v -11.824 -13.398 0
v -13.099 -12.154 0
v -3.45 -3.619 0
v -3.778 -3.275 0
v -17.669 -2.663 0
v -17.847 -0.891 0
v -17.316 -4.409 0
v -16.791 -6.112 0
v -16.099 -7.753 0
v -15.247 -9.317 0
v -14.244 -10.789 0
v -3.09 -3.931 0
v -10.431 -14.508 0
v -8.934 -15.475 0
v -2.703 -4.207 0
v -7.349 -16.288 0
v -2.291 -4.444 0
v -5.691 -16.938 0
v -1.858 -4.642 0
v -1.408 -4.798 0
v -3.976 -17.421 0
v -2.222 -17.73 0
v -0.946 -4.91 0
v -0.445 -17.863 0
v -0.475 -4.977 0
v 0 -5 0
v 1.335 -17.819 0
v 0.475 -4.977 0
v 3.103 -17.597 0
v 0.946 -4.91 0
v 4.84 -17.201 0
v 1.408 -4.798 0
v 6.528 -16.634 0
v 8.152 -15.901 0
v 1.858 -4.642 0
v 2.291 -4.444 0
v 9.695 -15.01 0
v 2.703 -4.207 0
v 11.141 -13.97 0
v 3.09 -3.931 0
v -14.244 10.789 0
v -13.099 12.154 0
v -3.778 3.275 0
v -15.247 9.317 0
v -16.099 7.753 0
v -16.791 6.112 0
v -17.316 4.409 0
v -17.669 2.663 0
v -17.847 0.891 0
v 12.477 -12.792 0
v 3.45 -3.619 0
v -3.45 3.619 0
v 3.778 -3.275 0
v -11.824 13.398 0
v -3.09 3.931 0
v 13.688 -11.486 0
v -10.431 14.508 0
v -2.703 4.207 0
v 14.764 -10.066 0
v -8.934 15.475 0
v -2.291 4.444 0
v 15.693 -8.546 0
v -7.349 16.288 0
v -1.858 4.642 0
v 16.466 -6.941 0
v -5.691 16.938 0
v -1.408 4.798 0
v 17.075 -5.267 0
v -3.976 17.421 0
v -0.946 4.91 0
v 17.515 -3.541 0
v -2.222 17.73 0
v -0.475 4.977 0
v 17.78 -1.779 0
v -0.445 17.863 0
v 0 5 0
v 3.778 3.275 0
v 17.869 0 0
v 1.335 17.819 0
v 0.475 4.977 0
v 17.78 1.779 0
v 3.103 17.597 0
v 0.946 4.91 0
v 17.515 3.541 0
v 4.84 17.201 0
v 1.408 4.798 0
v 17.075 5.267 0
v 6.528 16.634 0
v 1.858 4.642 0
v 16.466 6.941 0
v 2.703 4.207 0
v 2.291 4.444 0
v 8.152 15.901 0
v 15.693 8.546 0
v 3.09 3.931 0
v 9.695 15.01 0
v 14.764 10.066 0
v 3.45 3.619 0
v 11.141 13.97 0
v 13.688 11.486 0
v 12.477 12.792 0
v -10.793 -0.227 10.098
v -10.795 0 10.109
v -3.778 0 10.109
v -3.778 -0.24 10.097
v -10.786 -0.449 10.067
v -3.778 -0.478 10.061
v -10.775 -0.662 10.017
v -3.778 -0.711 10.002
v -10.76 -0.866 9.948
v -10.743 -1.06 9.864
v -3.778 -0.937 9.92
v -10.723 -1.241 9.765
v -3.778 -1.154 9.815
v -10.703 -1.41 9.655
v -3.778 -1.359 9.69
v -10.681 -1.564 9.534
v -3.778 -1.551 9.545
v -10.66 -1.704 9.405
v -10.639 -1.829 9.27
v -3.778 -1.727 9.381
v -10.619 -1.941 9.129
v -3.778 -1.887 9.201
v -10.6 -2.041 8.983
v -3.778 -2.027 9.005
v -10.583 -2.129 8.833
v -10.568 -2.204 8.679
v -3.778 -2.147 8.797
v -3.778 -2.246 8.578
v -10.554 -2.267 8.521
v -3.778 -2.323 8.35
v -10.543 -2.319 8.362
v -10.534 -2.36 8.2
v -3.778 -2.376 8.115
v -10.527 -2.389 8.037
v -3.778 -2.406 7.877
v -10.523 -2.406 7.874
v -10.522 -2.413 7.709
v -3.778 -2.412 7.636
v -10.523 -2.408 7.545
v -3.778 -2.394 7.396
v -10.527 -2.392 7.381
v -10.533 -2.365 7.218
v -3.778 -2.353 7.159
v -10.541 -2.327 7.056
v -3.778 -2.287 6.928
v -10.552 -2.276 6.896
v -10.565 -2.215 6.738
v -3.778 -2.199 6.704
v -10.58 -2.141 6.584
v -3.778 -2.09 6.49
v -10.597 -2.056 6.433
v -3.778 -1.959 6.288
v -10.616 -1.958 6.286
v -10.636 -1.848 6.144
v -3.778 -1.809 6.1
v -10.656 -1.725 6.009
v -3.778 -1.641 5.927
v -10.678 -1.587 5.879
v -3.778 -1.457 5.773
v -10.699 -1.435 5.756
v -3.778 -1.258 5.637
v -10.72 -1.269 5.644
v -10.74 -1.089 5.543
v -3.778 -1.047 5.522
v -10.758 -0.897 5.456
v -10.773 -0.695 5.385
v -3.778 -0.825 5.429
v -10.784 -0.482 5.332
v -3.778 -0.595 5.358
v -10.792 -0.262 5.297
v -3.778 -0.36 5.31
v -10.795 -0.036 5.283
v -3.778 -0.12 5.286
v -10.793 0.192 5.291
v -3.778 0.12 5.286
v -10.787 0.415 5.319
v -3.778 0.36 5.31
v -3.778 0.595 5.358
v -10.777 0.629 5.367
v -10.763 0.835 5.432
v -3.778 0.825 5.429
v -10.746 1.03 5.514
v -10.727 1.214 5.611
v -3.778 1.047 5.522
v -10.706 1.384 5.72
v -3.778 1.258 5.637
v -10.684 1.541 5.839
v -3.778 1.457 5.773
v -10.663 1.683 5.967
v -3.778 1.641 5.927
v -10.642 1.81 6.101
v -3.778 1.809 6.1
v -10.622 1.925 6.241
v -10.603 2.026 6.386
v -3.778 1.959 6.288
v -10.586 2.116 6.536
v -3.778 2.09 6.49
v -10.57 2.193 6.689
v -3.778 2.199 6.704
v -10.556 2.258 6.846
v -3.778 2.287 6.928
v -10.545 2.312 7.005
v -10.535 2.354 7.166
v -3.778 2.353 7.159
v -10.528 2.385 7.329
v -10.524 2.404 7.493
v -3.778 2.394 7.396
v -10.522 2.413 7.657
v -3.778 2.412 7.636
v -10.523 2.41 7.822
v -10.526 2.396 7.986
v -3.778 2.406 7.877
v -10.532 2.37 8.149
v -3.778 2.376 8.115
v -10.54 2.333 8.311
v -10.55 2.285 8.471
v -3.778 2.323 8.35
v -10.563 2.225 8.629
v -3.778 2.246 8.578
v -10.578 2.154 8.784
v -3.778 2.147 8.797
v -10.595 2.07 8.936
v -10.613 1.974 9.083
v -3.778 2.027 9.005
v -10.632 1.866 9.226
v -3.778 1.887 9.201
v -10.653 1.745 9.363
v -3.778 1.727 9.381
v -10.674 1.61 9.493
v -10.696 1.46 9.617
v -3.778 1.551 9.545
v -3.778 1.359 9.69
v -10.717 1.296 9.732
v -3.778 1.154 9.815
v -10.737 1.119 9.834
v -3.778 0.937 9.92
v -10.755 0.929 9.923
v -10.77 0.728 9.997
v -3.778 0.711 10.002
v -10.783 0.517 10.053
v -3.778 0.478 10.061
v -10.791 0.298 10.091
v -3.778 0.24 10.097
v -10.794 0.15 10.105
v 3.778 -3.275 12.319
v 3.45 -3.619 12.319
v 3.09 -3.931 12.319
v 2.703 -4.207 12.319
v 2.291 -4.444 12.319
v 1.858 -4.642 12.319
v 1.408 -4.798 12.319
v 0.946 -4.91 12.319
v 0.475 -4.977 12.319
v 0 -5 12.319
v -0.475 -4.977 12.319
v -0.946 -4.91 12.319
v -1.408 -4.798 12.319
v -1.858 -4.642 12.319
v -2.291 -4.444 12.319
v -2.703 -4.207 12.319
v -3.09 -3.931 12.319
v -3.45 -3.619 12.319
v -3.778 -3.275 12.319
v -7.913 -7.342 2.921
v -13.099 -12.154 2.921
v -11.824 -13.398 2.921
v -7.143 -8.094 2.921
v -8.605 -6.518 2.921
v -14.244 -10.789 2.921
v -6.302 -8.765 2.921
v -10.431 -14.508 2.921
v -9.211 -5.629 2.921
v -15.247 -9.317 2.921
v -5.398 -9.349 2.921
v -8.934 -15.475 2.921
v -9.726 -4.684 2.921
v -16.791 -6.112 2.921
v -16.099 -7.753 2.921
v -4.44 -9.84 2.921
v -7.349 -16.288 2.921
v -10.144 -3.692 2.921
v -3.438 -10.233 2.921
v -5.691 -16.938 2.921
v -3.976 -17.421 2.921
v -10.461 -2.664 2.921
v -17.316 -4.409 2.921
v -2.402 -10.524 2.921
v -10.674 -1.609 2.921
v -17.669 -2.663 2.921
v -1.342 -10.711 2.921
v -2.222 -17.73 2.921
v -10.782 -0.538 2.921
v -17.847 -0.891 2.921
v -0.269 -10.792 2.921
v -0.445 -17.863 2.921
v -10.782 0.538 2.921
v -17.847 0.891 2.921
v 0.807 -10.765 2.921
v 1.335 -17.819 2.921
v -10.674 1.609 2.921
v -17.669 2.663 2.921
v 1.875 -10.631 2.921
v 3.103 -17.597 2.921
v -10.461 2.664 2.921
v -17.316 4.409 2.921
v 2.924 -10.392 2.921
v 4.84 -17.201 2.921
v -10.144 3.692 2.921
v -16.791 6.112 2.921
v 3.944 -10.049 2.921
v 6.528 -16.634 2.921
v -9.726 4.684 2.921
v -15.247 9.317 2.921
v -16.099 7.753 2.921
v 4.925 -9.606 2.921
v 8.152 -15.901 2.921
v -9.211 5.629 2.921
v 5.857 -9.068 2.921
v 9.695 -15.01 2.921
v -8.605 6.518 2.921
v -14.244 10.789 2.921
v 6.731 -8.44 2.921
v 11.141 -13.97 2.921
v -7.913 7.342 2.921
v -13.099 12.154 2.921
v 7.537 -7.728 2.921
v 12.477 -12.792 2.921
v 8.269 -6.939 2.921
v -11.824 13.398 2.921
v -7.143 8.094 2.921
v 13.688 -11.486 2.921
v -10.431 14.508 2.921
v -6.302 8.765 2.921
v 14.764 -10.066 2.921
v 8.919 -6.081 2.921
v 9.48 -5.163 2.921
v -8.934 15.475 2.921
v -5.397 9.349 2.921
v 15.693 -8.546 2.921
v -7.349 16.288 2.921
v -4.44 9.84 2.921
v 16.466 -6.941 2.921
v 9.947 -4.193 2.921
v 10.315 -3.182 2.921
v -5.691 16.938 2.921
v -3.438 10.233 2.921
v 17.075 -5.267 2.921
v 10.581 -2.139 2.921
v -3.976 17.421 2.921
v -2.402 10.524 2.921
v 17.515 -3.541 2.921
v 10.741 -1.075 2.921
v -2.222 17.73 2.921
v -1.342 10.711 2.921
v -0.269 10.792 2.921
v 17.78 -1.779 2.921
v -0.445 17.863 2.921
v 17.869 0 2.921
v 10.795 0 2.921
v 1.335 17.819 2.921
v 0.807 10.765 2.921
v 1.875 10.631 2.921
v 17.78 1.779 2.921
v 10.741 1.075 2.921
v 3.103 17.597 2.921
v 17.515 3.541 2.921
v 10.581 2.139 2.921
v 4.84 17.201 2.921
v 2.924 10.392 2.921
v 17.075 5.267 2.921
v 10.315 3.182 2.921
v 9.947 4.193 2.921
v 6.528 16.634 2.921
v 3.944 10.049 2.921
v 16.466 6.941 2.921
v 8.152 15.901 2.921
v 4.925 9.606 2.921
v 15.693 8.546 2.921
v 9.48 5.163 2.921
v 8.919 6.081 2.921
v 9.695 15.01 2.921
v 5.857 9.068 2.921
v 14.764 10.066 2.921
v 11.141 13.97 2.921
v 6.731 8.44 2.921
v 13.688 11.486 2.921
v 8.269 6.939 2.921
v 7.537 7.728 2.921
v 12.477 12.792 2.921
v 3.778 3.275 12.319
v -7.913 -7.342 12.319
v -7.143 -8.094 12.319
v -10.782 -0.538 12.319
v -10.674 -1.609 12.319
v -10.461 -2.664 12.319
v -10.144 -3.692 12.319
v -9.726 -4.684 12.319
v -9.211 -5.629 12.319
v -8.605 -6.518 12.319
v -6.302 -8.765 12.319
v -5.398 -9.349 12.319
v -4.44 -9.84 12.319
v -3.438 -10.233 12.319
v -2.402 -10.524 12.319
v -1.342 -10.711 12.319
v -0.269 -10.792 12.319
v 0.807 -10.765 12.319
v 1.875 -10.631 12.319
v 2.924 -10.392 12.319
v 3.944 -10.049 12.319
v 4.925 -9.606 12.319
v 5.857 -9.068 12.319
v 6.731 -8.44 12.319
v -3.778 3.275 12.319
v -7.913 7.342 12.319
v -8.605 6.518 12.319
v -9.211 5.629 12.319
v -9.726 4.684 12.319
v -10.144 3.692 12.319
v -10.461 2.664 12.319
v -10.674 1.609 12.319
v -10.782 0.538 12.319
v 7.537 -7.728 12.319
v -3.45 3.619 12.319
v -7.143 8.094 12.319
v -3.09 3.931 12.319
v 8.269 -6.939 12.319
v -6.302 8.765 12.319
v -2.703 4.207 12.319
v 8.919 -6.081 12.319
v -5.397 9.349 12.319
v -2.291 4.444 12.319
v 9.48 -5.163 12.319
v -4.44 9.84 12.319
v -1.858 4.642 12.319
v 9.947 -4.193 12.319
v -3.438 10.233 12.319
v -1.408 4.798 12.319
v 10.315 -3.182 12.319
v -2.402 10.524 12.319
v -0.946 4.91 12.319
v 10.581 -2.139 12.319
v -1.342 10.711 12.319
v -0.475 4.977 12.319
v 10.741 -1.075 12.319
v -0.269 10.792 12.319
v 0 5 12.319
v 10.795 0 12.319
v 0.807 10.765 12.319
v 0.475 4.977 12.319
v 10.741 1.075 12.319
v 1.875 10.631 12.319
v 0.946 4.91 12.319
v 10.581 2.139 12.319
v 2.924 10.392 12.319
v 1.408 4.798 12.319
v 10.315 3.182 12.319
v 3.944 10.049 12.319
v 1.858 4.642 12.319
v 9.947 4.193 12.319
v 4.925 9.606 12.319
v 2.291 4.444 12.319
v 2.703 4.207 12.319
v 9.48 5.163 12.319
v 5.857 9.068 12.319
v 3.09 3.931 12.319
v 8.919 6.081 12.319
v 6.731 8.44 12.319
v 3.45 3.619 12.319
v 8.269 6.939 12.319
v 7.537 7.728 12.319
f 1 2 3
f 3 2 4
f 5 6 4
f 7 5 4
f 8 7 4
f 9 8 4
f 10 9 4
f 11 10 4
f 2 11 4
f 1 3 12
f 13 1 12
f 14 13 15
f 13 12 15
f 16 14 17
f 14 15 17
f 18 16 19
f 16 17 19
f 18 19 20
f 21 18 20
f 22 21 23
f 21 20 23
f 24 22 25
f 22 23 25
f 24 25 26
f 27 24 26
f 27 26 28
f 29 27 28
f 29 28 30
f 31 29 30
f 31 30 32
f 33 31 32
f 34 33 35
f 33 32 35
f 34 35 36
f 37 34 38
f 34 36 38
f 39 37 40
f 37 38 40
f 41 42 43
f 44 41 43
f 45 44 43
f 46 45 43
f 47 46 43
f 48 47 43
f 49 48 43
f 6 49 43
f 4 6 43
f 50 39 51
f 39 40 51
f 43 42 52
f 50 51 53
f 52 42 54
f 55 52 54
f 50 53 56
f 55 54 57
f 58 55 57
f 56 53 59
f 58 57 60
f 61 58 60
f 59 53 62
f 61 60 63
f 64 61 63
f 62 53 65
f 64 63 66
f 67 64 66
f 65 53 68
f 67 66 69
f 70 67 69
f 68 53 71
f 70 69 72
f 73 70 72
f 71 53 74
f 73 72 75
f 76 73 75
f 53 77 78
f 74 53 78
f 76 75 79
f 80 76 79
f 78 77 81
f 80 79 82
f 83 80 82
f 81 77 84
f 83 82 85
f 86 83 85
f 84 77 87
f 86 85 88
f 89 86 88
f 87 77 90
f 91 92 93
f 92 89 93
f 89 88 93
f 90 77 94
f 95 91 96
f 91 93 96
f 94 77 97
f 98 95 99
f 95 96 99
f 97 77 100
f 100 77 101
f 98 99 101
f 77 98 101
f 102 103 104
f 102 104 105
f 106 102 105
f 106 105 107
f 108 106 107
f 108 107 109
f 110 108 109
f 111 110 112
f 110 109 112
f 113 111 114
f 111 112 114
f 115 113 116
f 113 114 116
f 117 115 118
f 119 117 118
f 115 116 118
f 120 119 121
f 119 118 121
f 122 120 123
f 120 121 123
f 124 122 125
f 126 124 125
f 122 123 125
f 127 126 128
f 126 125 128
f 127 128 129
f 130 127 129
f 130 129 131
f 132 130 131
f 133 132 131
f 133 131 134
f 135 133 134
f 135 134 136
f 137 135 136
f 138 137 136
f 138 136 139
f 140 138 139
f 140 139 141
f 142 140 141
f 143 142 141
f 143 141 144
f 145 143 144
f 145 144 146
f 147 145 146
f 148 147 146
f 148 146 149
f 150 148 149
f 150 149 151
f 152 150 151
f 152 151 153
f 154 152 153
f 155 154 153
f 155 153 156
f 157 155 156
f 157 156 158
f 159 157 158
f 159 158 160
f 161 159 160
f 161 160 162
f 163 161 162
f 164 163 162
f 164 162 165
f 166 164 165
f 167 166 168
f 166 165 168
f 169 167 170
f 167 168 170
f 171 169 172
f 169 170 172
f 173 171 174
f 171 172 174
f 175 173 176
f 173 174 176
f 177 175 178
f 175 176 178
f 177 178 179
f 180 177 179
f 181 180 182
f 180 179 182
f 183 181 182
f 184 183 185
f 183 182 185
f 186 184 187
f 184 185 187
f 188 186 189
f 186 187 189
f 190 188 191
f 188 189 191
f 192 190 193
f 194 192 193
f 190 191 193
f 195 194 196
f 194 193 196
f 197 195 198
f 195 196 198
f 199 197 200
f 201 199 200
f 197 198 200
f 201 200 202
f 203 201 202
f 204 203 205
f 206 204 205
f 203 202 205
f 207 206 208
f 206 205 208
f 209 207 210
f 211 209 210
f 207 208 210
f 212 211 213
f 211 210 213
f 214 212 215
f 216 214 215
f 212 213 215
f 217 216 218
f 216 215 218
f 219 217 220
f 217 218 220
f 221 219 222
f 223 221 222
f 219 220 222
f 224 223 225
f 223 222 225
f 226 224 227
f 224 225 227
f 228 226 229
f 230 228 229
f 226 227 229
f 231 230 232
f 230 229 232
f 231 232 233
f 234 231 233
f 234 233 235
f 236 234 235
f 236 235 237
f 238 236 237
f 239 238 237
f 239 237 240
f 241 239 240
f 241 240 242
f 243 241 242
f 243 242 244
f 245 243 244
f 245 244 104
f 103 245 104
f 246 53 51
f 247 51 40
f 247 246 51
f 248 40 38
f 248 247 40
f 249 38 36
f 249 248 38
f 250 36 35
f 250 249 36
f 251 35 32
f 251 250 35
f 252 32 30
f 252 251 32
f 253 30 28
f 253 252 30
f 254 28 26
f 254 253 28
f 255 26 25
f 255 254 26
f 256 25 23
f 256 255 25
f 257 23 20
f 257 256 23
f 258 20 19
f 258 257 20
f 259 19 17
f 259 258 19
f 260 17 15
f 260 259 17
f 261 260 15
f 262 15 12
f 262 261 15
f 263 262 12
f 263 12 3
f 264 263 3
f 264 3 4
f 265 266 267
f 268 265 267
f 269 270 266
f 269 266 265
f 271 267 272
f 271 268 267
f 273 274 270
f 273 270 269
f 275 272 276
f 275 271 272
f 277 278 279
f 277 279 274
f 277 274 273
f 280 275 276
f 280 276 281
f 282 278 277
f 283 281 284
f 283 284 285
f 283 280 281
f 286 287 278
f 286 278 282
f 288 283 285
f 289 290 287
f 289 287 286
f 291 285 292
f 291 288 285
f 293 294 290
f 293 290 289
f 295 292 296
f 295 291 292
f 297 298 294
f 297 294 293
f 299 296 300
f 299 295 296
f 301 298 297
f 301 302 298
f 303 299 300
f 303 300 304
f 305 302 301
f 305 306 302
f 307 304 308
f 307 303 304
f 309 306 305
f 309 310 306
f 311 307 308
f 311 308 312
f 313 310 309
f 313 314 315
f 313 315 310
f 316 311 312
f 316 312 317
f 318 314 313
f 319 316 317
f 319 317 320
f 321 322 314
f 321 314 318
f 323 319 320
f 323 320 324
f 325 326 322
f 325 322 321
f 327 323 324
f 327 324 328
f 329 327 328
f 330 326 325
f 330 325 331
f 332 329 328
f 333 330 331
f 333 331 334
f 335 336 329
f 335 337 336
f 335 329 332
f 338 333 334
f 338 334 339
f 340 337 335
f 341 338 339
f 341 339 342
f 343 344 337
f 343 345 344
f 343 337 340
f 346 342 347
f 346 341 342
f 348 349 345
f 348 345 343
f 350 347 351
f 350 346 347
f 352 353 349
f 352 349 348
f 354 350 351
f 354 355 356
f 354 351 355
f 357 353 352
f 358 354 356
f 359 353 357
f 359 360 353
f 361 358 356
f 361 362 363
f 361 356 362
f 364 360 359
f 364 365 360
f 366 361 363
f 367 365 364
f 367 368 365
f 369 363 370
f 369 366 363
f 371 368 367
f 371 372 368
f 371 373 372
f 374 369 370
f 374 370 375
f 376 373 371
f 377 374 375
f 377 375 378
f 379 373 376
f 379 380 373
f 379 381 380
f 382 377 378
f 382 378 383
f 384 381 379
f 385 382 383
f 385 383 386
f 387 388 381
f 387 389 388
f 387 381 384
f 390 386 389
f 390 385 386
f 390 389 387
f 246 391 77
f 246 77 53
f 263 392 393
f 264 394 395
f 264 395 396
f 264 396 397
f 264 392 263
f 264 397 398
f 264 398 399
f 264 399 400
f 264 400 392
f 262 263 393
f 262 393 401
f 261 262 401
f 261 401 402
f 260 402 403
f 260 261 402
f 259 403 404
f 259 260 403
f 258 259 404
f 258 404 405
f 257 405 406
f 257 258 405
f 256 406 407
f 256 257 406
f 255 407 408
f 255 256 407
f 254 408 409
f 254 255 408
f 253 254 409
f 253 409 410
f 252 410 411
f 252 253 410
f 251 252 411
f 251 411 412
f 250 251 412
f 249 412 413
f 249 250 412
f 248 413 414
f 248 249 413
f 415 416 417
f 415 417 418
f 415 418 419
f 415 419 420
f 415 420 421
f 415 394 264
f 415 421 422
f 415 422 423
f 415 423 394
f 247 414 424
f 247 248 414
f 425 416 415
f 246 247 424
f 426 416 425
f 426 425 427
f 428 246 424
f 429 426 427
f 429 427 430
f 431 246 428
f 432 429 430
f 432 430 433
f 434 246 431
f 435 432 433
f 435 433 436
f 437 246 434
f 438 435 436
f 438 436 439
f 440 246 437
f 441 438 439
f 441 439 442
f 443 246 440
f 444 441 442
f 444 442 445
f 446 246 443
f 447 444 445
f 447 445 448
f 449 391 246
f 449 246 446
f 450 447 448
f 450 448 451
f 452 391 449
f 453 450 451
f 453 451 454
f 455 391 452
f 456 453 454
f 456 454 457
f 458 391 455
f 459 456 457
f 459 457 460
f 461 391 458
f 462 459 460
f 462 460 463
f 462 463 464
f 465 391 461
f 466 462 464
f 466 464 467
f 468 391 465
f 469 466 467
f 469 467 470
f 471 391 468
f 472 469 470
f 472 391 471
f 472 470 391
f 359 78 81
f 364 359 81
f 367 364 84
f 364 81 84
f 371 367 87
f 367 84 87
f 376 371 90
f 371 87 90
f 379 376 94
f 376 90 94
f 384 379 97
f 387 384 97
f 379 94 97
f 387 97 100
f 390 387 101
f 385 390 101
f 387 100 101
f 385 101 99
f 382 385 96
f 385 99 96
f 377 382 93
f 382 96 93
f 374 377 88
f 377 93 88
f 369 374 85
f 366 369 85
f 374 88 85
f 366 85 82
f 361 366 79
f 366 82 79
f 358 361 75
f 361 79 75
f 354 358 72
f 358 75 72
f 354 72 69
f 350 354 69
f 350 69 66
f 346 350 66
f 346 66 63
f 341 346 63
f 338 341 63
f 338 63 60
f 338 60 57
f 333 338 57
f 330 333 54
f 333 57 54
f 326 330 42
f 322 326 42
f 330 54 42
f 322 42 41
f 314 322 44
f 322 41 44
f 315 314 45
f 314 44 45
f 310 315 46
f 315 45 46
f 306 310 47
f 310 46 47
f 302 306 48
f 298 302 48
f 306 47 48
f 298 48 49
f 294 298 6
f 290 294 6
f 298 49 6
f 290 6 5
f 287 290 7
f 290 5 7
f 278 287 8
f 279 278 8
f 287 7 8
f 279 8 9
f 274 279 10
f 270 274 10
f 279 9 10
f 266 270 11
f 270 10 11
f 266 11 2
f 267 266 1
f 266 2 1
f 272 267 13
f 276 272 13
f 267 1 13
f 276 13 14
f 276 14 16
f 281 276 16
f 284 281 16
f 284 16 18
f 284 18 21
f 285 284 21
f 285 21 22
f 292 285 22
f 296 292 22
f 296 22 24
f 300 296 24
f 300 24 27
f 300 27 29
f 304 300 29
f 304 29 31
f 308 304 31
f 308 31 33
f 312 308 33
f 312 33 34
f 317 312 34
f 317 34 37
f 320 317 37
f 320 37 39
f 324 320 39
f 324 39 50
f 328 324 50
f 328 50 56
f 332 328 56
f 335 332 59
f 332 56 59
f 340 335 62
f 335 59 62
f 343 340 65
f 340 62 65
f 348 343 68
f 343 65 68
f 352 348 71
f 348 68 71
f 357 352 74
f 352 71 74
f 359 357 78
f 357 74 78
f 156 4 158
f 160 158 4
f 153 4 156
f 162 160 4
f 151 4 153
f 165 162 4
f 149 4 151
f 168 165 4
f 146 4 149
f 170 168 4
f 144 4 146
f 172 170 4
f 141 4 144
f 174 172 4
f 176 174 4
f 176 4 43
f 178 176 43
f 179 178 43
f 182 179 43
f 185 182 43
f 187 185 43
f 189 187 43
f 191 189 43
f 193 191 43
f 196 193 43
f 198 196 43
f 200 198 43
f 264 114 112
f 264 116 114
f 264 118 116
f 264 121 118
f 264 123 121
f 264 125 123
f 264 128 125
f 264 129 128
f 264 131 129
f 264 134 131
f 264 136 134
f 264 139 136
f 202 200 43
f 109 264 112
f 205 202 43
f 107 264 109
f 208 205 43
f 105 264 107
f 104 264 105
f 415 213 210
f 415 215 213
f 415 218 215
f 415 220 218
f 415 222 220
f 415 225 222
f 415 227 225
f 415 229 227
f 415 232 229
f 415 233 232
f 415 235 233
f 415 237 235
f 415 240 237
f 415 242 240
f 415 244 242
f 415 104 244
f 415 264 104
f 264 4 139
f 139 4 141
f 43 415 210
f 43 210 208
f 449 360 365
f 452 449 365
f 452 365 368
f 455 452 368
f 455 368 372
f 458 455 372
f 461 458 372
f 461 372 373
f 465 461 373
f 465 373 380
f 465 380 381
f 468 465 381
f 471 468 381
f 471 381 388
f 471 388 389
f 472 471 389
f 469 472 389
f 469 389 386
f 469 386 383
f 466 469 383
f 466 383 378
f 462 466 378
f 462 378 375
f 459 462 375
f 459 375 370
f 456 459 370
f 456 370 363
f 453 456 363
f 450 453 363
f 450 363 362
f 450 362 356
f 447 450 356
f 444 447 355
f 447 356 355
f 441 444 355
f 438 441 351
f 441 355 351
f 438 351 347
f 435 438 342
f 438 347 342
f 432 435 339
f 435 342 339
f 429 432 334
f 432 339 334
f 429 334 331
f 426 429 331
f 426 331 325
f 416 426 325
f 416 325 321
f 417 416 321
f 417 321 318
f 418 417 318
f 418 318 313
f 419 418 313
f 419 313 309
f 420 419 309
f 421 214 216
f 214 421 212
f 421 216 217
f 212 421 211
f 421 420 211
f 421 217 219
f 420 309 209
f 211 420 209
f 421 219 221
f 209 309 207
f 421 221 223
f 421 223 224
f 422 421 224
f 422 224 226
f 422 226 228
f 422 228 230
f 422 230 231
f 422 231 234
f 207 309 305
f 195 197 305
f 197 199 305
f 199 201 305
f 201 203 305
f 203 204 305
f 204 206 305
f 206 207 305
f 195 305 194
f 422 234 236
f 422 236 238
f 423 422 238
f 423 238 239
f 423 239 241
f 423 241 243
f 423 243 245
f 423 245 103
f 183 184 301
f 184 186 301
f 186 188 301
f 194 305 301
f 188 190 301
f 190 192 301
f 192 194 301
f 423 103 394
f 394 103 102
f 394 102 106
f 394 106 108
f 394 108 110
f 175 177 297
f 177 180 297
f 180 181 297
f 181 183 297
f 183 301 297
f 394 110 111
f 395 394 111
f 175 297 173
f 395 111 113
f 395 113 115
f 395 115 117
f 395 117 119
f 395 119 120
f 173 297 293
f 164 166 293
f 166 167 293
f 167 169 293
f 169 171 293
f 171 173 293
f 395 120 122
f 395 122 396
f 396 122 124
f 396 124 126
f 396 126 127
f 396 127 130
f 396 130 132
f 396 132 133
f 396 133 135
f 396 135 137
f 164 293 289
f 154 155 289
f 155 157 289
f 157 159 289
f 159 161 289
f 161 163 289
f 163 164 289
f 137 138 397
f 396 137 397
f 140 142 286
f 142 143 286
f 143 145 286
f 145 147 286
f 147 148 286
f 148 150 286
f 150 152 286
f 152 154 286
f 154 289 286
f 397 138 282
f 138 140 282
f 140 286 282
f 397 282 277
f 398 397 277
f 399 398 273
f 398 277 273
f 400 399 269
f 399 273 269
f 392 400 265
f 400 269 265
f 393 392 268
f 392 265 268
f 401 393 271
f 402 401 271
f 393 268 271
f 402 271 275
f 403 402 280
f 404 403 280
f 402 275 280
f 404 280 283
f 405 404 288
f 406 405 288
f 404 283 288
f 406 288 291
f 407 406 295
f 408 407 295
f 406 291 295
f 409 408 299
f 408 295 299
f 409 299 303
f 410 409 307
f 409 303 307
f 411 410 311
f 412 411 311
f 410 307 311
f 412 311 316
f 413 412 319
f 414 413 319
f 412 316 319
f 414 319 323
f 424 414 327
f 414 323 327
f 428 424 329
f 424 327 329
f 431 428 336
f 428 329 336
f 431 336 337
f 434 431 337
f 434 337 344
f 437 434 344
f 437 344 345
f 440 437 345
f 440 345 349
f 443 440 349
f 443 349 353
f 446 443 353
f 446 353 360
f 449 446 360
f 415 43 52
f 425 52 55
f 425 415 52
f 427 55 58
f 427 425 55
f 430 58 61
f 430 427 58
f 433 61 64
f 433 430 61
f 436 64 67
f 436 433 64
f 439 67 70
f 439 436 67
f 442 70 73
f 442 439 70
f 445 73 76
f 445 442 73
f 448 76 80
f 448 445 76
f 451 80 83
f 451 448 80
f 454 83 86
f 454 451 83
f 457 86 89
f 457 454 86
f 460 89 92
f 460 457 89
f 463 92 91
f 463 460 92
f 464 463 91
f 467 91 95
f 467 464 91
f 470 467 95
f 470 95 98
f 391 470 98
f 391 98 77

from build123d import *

# Parameters (mm, degrees)
SKETCH1_R           = 17.8689
BOSS_EXTRUDE1_DEPTH = 2.921
SKETCH2_R           = 10.795
BOSS_EXTRUDE2_DEPTH = 9.398
CUT_EXTRUDE1_DEPTH  = 29.113216383
SKETCH4_R           = 2.413
CUT_EXTRUDE2_DEPTH  = 16.002


with BuildPart() as part:
    # Sketch1 → Boss-Extrude1 (new body)
    with BuildSketch(Plane.XY):
        Circle(SKETCH1_R)
    extrude(amount=BOSS_EXTRUDE1_DEPTH)

    # Sketch2 → Boss-Extrude2 (add)
    with BuildSketch(Plane.XY.offset(2.921)):
        Circle(SKETCH2_R)
    extrude(amount=BOSS_EXTRUDE2_DEPTH)

    # Sketch3 → Cut-Extrude1 (cut, through all)
    with BuildSketch(Plane.XY.offset(12.319)):
        with BuildLine():
            Line((-3.77825, -3.274862888), (-3.77825, 3.274862888))
            ThreePointArc((-3.77825, 3.274862888), (0, 4.99999), (3.77825, 3.274862888))
            Line((3.77825, 3.274862888), (3.77825, -3.274862888))
            ThreePointArc((3.77825, -3.274862888), (0, -4.99999), (-3.77825, -3.274862888))
        make_face()
    extrude(amount=-CUT_EXTRUDE1_DEPTH, mode=Mode.SUBTRACT)

    # Sketch4 → Cut-Extrude2 (cut)
    with BuildSketch(Plane(origin=(0, 0, 0), x_dir=(0, 0, -1), z_dir=(1, 0, 0))):
        with Locations(Location((-7.6962, 0, 0), (0, 0, 180))):
            Circle(SKETCH4_R)
    extrude(amount=-CUT_EXTRUDE2_DEPTH, mode=Mode.SUBTRACT)


solid = part.part
